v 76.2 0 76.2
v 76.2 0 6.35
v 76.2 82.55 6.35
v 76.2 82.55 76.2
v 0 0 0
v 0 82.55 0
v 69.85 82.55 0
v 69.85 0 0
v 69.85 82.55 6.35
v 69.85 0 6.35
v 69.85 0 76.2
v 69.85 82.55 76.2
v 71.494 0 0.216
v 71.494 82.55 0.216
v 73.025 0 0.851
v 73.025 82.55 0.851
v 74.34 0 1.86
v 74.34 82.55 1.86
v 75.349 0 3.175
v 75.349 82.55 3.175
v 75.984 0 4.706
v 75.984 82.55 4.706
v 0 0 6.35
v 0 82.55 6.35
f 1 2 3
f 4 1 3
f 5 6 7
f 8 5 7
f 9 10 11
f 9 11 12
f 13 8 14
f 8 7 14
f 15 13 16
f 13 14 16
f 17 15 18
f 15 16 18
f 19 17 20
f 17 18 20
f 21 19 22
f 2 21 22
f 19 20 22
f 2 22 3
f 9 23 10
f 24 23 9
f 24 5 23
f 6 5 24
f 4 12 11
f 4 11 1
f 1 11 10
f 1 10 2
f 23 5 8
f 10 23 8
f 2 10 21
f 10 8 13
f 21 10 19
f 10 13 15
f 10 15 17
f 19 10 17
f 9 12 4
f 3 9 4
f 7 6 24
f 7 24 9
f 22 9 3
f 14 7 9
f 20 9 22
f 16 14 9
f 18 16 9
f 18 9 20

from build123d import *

# Parameters (mm, degrees)
F0_W     = 69.85
F0_H     = 82.55
F1_DEPTH = 6.35
F2_W     = 82.55
F2_H     = 6.35
F3_ANGLE = -90
F4_W     = 6.35
F4_H     = 82.55
F5_DEPTH = 69.85


with BuildPart() as f1:
    # F0 (on Top) → F1 (new body)
    with BuildSketch(Plane.XY):
        with Locations((34.925, 41.275)):
            Rectangle(F0_W, F0_H)
    extrude(amount=F1_DEPTH)

    # F2 (on face) → F3 (revolve)
    with BuildSketch(Plane.YZ.offset(69.85)):
        with Locations((41.275, 3.175)):
            Rectangle(F2_W, F2_H)
    revolve(axis=Axis((69.85, 41.275, 6.35), (0, 1, 0)), revolution_arc=F3_ANGLE)

    # F4 (on face) → F5 (join)
    with BuildSketch(Plane.XY.offset(6.35)):
        with Locations((73.025, 41.275)):
            Rectangle(F4_W, F4_H)
    extrude(amount=F5_DEPTH)


solid = f1.part
